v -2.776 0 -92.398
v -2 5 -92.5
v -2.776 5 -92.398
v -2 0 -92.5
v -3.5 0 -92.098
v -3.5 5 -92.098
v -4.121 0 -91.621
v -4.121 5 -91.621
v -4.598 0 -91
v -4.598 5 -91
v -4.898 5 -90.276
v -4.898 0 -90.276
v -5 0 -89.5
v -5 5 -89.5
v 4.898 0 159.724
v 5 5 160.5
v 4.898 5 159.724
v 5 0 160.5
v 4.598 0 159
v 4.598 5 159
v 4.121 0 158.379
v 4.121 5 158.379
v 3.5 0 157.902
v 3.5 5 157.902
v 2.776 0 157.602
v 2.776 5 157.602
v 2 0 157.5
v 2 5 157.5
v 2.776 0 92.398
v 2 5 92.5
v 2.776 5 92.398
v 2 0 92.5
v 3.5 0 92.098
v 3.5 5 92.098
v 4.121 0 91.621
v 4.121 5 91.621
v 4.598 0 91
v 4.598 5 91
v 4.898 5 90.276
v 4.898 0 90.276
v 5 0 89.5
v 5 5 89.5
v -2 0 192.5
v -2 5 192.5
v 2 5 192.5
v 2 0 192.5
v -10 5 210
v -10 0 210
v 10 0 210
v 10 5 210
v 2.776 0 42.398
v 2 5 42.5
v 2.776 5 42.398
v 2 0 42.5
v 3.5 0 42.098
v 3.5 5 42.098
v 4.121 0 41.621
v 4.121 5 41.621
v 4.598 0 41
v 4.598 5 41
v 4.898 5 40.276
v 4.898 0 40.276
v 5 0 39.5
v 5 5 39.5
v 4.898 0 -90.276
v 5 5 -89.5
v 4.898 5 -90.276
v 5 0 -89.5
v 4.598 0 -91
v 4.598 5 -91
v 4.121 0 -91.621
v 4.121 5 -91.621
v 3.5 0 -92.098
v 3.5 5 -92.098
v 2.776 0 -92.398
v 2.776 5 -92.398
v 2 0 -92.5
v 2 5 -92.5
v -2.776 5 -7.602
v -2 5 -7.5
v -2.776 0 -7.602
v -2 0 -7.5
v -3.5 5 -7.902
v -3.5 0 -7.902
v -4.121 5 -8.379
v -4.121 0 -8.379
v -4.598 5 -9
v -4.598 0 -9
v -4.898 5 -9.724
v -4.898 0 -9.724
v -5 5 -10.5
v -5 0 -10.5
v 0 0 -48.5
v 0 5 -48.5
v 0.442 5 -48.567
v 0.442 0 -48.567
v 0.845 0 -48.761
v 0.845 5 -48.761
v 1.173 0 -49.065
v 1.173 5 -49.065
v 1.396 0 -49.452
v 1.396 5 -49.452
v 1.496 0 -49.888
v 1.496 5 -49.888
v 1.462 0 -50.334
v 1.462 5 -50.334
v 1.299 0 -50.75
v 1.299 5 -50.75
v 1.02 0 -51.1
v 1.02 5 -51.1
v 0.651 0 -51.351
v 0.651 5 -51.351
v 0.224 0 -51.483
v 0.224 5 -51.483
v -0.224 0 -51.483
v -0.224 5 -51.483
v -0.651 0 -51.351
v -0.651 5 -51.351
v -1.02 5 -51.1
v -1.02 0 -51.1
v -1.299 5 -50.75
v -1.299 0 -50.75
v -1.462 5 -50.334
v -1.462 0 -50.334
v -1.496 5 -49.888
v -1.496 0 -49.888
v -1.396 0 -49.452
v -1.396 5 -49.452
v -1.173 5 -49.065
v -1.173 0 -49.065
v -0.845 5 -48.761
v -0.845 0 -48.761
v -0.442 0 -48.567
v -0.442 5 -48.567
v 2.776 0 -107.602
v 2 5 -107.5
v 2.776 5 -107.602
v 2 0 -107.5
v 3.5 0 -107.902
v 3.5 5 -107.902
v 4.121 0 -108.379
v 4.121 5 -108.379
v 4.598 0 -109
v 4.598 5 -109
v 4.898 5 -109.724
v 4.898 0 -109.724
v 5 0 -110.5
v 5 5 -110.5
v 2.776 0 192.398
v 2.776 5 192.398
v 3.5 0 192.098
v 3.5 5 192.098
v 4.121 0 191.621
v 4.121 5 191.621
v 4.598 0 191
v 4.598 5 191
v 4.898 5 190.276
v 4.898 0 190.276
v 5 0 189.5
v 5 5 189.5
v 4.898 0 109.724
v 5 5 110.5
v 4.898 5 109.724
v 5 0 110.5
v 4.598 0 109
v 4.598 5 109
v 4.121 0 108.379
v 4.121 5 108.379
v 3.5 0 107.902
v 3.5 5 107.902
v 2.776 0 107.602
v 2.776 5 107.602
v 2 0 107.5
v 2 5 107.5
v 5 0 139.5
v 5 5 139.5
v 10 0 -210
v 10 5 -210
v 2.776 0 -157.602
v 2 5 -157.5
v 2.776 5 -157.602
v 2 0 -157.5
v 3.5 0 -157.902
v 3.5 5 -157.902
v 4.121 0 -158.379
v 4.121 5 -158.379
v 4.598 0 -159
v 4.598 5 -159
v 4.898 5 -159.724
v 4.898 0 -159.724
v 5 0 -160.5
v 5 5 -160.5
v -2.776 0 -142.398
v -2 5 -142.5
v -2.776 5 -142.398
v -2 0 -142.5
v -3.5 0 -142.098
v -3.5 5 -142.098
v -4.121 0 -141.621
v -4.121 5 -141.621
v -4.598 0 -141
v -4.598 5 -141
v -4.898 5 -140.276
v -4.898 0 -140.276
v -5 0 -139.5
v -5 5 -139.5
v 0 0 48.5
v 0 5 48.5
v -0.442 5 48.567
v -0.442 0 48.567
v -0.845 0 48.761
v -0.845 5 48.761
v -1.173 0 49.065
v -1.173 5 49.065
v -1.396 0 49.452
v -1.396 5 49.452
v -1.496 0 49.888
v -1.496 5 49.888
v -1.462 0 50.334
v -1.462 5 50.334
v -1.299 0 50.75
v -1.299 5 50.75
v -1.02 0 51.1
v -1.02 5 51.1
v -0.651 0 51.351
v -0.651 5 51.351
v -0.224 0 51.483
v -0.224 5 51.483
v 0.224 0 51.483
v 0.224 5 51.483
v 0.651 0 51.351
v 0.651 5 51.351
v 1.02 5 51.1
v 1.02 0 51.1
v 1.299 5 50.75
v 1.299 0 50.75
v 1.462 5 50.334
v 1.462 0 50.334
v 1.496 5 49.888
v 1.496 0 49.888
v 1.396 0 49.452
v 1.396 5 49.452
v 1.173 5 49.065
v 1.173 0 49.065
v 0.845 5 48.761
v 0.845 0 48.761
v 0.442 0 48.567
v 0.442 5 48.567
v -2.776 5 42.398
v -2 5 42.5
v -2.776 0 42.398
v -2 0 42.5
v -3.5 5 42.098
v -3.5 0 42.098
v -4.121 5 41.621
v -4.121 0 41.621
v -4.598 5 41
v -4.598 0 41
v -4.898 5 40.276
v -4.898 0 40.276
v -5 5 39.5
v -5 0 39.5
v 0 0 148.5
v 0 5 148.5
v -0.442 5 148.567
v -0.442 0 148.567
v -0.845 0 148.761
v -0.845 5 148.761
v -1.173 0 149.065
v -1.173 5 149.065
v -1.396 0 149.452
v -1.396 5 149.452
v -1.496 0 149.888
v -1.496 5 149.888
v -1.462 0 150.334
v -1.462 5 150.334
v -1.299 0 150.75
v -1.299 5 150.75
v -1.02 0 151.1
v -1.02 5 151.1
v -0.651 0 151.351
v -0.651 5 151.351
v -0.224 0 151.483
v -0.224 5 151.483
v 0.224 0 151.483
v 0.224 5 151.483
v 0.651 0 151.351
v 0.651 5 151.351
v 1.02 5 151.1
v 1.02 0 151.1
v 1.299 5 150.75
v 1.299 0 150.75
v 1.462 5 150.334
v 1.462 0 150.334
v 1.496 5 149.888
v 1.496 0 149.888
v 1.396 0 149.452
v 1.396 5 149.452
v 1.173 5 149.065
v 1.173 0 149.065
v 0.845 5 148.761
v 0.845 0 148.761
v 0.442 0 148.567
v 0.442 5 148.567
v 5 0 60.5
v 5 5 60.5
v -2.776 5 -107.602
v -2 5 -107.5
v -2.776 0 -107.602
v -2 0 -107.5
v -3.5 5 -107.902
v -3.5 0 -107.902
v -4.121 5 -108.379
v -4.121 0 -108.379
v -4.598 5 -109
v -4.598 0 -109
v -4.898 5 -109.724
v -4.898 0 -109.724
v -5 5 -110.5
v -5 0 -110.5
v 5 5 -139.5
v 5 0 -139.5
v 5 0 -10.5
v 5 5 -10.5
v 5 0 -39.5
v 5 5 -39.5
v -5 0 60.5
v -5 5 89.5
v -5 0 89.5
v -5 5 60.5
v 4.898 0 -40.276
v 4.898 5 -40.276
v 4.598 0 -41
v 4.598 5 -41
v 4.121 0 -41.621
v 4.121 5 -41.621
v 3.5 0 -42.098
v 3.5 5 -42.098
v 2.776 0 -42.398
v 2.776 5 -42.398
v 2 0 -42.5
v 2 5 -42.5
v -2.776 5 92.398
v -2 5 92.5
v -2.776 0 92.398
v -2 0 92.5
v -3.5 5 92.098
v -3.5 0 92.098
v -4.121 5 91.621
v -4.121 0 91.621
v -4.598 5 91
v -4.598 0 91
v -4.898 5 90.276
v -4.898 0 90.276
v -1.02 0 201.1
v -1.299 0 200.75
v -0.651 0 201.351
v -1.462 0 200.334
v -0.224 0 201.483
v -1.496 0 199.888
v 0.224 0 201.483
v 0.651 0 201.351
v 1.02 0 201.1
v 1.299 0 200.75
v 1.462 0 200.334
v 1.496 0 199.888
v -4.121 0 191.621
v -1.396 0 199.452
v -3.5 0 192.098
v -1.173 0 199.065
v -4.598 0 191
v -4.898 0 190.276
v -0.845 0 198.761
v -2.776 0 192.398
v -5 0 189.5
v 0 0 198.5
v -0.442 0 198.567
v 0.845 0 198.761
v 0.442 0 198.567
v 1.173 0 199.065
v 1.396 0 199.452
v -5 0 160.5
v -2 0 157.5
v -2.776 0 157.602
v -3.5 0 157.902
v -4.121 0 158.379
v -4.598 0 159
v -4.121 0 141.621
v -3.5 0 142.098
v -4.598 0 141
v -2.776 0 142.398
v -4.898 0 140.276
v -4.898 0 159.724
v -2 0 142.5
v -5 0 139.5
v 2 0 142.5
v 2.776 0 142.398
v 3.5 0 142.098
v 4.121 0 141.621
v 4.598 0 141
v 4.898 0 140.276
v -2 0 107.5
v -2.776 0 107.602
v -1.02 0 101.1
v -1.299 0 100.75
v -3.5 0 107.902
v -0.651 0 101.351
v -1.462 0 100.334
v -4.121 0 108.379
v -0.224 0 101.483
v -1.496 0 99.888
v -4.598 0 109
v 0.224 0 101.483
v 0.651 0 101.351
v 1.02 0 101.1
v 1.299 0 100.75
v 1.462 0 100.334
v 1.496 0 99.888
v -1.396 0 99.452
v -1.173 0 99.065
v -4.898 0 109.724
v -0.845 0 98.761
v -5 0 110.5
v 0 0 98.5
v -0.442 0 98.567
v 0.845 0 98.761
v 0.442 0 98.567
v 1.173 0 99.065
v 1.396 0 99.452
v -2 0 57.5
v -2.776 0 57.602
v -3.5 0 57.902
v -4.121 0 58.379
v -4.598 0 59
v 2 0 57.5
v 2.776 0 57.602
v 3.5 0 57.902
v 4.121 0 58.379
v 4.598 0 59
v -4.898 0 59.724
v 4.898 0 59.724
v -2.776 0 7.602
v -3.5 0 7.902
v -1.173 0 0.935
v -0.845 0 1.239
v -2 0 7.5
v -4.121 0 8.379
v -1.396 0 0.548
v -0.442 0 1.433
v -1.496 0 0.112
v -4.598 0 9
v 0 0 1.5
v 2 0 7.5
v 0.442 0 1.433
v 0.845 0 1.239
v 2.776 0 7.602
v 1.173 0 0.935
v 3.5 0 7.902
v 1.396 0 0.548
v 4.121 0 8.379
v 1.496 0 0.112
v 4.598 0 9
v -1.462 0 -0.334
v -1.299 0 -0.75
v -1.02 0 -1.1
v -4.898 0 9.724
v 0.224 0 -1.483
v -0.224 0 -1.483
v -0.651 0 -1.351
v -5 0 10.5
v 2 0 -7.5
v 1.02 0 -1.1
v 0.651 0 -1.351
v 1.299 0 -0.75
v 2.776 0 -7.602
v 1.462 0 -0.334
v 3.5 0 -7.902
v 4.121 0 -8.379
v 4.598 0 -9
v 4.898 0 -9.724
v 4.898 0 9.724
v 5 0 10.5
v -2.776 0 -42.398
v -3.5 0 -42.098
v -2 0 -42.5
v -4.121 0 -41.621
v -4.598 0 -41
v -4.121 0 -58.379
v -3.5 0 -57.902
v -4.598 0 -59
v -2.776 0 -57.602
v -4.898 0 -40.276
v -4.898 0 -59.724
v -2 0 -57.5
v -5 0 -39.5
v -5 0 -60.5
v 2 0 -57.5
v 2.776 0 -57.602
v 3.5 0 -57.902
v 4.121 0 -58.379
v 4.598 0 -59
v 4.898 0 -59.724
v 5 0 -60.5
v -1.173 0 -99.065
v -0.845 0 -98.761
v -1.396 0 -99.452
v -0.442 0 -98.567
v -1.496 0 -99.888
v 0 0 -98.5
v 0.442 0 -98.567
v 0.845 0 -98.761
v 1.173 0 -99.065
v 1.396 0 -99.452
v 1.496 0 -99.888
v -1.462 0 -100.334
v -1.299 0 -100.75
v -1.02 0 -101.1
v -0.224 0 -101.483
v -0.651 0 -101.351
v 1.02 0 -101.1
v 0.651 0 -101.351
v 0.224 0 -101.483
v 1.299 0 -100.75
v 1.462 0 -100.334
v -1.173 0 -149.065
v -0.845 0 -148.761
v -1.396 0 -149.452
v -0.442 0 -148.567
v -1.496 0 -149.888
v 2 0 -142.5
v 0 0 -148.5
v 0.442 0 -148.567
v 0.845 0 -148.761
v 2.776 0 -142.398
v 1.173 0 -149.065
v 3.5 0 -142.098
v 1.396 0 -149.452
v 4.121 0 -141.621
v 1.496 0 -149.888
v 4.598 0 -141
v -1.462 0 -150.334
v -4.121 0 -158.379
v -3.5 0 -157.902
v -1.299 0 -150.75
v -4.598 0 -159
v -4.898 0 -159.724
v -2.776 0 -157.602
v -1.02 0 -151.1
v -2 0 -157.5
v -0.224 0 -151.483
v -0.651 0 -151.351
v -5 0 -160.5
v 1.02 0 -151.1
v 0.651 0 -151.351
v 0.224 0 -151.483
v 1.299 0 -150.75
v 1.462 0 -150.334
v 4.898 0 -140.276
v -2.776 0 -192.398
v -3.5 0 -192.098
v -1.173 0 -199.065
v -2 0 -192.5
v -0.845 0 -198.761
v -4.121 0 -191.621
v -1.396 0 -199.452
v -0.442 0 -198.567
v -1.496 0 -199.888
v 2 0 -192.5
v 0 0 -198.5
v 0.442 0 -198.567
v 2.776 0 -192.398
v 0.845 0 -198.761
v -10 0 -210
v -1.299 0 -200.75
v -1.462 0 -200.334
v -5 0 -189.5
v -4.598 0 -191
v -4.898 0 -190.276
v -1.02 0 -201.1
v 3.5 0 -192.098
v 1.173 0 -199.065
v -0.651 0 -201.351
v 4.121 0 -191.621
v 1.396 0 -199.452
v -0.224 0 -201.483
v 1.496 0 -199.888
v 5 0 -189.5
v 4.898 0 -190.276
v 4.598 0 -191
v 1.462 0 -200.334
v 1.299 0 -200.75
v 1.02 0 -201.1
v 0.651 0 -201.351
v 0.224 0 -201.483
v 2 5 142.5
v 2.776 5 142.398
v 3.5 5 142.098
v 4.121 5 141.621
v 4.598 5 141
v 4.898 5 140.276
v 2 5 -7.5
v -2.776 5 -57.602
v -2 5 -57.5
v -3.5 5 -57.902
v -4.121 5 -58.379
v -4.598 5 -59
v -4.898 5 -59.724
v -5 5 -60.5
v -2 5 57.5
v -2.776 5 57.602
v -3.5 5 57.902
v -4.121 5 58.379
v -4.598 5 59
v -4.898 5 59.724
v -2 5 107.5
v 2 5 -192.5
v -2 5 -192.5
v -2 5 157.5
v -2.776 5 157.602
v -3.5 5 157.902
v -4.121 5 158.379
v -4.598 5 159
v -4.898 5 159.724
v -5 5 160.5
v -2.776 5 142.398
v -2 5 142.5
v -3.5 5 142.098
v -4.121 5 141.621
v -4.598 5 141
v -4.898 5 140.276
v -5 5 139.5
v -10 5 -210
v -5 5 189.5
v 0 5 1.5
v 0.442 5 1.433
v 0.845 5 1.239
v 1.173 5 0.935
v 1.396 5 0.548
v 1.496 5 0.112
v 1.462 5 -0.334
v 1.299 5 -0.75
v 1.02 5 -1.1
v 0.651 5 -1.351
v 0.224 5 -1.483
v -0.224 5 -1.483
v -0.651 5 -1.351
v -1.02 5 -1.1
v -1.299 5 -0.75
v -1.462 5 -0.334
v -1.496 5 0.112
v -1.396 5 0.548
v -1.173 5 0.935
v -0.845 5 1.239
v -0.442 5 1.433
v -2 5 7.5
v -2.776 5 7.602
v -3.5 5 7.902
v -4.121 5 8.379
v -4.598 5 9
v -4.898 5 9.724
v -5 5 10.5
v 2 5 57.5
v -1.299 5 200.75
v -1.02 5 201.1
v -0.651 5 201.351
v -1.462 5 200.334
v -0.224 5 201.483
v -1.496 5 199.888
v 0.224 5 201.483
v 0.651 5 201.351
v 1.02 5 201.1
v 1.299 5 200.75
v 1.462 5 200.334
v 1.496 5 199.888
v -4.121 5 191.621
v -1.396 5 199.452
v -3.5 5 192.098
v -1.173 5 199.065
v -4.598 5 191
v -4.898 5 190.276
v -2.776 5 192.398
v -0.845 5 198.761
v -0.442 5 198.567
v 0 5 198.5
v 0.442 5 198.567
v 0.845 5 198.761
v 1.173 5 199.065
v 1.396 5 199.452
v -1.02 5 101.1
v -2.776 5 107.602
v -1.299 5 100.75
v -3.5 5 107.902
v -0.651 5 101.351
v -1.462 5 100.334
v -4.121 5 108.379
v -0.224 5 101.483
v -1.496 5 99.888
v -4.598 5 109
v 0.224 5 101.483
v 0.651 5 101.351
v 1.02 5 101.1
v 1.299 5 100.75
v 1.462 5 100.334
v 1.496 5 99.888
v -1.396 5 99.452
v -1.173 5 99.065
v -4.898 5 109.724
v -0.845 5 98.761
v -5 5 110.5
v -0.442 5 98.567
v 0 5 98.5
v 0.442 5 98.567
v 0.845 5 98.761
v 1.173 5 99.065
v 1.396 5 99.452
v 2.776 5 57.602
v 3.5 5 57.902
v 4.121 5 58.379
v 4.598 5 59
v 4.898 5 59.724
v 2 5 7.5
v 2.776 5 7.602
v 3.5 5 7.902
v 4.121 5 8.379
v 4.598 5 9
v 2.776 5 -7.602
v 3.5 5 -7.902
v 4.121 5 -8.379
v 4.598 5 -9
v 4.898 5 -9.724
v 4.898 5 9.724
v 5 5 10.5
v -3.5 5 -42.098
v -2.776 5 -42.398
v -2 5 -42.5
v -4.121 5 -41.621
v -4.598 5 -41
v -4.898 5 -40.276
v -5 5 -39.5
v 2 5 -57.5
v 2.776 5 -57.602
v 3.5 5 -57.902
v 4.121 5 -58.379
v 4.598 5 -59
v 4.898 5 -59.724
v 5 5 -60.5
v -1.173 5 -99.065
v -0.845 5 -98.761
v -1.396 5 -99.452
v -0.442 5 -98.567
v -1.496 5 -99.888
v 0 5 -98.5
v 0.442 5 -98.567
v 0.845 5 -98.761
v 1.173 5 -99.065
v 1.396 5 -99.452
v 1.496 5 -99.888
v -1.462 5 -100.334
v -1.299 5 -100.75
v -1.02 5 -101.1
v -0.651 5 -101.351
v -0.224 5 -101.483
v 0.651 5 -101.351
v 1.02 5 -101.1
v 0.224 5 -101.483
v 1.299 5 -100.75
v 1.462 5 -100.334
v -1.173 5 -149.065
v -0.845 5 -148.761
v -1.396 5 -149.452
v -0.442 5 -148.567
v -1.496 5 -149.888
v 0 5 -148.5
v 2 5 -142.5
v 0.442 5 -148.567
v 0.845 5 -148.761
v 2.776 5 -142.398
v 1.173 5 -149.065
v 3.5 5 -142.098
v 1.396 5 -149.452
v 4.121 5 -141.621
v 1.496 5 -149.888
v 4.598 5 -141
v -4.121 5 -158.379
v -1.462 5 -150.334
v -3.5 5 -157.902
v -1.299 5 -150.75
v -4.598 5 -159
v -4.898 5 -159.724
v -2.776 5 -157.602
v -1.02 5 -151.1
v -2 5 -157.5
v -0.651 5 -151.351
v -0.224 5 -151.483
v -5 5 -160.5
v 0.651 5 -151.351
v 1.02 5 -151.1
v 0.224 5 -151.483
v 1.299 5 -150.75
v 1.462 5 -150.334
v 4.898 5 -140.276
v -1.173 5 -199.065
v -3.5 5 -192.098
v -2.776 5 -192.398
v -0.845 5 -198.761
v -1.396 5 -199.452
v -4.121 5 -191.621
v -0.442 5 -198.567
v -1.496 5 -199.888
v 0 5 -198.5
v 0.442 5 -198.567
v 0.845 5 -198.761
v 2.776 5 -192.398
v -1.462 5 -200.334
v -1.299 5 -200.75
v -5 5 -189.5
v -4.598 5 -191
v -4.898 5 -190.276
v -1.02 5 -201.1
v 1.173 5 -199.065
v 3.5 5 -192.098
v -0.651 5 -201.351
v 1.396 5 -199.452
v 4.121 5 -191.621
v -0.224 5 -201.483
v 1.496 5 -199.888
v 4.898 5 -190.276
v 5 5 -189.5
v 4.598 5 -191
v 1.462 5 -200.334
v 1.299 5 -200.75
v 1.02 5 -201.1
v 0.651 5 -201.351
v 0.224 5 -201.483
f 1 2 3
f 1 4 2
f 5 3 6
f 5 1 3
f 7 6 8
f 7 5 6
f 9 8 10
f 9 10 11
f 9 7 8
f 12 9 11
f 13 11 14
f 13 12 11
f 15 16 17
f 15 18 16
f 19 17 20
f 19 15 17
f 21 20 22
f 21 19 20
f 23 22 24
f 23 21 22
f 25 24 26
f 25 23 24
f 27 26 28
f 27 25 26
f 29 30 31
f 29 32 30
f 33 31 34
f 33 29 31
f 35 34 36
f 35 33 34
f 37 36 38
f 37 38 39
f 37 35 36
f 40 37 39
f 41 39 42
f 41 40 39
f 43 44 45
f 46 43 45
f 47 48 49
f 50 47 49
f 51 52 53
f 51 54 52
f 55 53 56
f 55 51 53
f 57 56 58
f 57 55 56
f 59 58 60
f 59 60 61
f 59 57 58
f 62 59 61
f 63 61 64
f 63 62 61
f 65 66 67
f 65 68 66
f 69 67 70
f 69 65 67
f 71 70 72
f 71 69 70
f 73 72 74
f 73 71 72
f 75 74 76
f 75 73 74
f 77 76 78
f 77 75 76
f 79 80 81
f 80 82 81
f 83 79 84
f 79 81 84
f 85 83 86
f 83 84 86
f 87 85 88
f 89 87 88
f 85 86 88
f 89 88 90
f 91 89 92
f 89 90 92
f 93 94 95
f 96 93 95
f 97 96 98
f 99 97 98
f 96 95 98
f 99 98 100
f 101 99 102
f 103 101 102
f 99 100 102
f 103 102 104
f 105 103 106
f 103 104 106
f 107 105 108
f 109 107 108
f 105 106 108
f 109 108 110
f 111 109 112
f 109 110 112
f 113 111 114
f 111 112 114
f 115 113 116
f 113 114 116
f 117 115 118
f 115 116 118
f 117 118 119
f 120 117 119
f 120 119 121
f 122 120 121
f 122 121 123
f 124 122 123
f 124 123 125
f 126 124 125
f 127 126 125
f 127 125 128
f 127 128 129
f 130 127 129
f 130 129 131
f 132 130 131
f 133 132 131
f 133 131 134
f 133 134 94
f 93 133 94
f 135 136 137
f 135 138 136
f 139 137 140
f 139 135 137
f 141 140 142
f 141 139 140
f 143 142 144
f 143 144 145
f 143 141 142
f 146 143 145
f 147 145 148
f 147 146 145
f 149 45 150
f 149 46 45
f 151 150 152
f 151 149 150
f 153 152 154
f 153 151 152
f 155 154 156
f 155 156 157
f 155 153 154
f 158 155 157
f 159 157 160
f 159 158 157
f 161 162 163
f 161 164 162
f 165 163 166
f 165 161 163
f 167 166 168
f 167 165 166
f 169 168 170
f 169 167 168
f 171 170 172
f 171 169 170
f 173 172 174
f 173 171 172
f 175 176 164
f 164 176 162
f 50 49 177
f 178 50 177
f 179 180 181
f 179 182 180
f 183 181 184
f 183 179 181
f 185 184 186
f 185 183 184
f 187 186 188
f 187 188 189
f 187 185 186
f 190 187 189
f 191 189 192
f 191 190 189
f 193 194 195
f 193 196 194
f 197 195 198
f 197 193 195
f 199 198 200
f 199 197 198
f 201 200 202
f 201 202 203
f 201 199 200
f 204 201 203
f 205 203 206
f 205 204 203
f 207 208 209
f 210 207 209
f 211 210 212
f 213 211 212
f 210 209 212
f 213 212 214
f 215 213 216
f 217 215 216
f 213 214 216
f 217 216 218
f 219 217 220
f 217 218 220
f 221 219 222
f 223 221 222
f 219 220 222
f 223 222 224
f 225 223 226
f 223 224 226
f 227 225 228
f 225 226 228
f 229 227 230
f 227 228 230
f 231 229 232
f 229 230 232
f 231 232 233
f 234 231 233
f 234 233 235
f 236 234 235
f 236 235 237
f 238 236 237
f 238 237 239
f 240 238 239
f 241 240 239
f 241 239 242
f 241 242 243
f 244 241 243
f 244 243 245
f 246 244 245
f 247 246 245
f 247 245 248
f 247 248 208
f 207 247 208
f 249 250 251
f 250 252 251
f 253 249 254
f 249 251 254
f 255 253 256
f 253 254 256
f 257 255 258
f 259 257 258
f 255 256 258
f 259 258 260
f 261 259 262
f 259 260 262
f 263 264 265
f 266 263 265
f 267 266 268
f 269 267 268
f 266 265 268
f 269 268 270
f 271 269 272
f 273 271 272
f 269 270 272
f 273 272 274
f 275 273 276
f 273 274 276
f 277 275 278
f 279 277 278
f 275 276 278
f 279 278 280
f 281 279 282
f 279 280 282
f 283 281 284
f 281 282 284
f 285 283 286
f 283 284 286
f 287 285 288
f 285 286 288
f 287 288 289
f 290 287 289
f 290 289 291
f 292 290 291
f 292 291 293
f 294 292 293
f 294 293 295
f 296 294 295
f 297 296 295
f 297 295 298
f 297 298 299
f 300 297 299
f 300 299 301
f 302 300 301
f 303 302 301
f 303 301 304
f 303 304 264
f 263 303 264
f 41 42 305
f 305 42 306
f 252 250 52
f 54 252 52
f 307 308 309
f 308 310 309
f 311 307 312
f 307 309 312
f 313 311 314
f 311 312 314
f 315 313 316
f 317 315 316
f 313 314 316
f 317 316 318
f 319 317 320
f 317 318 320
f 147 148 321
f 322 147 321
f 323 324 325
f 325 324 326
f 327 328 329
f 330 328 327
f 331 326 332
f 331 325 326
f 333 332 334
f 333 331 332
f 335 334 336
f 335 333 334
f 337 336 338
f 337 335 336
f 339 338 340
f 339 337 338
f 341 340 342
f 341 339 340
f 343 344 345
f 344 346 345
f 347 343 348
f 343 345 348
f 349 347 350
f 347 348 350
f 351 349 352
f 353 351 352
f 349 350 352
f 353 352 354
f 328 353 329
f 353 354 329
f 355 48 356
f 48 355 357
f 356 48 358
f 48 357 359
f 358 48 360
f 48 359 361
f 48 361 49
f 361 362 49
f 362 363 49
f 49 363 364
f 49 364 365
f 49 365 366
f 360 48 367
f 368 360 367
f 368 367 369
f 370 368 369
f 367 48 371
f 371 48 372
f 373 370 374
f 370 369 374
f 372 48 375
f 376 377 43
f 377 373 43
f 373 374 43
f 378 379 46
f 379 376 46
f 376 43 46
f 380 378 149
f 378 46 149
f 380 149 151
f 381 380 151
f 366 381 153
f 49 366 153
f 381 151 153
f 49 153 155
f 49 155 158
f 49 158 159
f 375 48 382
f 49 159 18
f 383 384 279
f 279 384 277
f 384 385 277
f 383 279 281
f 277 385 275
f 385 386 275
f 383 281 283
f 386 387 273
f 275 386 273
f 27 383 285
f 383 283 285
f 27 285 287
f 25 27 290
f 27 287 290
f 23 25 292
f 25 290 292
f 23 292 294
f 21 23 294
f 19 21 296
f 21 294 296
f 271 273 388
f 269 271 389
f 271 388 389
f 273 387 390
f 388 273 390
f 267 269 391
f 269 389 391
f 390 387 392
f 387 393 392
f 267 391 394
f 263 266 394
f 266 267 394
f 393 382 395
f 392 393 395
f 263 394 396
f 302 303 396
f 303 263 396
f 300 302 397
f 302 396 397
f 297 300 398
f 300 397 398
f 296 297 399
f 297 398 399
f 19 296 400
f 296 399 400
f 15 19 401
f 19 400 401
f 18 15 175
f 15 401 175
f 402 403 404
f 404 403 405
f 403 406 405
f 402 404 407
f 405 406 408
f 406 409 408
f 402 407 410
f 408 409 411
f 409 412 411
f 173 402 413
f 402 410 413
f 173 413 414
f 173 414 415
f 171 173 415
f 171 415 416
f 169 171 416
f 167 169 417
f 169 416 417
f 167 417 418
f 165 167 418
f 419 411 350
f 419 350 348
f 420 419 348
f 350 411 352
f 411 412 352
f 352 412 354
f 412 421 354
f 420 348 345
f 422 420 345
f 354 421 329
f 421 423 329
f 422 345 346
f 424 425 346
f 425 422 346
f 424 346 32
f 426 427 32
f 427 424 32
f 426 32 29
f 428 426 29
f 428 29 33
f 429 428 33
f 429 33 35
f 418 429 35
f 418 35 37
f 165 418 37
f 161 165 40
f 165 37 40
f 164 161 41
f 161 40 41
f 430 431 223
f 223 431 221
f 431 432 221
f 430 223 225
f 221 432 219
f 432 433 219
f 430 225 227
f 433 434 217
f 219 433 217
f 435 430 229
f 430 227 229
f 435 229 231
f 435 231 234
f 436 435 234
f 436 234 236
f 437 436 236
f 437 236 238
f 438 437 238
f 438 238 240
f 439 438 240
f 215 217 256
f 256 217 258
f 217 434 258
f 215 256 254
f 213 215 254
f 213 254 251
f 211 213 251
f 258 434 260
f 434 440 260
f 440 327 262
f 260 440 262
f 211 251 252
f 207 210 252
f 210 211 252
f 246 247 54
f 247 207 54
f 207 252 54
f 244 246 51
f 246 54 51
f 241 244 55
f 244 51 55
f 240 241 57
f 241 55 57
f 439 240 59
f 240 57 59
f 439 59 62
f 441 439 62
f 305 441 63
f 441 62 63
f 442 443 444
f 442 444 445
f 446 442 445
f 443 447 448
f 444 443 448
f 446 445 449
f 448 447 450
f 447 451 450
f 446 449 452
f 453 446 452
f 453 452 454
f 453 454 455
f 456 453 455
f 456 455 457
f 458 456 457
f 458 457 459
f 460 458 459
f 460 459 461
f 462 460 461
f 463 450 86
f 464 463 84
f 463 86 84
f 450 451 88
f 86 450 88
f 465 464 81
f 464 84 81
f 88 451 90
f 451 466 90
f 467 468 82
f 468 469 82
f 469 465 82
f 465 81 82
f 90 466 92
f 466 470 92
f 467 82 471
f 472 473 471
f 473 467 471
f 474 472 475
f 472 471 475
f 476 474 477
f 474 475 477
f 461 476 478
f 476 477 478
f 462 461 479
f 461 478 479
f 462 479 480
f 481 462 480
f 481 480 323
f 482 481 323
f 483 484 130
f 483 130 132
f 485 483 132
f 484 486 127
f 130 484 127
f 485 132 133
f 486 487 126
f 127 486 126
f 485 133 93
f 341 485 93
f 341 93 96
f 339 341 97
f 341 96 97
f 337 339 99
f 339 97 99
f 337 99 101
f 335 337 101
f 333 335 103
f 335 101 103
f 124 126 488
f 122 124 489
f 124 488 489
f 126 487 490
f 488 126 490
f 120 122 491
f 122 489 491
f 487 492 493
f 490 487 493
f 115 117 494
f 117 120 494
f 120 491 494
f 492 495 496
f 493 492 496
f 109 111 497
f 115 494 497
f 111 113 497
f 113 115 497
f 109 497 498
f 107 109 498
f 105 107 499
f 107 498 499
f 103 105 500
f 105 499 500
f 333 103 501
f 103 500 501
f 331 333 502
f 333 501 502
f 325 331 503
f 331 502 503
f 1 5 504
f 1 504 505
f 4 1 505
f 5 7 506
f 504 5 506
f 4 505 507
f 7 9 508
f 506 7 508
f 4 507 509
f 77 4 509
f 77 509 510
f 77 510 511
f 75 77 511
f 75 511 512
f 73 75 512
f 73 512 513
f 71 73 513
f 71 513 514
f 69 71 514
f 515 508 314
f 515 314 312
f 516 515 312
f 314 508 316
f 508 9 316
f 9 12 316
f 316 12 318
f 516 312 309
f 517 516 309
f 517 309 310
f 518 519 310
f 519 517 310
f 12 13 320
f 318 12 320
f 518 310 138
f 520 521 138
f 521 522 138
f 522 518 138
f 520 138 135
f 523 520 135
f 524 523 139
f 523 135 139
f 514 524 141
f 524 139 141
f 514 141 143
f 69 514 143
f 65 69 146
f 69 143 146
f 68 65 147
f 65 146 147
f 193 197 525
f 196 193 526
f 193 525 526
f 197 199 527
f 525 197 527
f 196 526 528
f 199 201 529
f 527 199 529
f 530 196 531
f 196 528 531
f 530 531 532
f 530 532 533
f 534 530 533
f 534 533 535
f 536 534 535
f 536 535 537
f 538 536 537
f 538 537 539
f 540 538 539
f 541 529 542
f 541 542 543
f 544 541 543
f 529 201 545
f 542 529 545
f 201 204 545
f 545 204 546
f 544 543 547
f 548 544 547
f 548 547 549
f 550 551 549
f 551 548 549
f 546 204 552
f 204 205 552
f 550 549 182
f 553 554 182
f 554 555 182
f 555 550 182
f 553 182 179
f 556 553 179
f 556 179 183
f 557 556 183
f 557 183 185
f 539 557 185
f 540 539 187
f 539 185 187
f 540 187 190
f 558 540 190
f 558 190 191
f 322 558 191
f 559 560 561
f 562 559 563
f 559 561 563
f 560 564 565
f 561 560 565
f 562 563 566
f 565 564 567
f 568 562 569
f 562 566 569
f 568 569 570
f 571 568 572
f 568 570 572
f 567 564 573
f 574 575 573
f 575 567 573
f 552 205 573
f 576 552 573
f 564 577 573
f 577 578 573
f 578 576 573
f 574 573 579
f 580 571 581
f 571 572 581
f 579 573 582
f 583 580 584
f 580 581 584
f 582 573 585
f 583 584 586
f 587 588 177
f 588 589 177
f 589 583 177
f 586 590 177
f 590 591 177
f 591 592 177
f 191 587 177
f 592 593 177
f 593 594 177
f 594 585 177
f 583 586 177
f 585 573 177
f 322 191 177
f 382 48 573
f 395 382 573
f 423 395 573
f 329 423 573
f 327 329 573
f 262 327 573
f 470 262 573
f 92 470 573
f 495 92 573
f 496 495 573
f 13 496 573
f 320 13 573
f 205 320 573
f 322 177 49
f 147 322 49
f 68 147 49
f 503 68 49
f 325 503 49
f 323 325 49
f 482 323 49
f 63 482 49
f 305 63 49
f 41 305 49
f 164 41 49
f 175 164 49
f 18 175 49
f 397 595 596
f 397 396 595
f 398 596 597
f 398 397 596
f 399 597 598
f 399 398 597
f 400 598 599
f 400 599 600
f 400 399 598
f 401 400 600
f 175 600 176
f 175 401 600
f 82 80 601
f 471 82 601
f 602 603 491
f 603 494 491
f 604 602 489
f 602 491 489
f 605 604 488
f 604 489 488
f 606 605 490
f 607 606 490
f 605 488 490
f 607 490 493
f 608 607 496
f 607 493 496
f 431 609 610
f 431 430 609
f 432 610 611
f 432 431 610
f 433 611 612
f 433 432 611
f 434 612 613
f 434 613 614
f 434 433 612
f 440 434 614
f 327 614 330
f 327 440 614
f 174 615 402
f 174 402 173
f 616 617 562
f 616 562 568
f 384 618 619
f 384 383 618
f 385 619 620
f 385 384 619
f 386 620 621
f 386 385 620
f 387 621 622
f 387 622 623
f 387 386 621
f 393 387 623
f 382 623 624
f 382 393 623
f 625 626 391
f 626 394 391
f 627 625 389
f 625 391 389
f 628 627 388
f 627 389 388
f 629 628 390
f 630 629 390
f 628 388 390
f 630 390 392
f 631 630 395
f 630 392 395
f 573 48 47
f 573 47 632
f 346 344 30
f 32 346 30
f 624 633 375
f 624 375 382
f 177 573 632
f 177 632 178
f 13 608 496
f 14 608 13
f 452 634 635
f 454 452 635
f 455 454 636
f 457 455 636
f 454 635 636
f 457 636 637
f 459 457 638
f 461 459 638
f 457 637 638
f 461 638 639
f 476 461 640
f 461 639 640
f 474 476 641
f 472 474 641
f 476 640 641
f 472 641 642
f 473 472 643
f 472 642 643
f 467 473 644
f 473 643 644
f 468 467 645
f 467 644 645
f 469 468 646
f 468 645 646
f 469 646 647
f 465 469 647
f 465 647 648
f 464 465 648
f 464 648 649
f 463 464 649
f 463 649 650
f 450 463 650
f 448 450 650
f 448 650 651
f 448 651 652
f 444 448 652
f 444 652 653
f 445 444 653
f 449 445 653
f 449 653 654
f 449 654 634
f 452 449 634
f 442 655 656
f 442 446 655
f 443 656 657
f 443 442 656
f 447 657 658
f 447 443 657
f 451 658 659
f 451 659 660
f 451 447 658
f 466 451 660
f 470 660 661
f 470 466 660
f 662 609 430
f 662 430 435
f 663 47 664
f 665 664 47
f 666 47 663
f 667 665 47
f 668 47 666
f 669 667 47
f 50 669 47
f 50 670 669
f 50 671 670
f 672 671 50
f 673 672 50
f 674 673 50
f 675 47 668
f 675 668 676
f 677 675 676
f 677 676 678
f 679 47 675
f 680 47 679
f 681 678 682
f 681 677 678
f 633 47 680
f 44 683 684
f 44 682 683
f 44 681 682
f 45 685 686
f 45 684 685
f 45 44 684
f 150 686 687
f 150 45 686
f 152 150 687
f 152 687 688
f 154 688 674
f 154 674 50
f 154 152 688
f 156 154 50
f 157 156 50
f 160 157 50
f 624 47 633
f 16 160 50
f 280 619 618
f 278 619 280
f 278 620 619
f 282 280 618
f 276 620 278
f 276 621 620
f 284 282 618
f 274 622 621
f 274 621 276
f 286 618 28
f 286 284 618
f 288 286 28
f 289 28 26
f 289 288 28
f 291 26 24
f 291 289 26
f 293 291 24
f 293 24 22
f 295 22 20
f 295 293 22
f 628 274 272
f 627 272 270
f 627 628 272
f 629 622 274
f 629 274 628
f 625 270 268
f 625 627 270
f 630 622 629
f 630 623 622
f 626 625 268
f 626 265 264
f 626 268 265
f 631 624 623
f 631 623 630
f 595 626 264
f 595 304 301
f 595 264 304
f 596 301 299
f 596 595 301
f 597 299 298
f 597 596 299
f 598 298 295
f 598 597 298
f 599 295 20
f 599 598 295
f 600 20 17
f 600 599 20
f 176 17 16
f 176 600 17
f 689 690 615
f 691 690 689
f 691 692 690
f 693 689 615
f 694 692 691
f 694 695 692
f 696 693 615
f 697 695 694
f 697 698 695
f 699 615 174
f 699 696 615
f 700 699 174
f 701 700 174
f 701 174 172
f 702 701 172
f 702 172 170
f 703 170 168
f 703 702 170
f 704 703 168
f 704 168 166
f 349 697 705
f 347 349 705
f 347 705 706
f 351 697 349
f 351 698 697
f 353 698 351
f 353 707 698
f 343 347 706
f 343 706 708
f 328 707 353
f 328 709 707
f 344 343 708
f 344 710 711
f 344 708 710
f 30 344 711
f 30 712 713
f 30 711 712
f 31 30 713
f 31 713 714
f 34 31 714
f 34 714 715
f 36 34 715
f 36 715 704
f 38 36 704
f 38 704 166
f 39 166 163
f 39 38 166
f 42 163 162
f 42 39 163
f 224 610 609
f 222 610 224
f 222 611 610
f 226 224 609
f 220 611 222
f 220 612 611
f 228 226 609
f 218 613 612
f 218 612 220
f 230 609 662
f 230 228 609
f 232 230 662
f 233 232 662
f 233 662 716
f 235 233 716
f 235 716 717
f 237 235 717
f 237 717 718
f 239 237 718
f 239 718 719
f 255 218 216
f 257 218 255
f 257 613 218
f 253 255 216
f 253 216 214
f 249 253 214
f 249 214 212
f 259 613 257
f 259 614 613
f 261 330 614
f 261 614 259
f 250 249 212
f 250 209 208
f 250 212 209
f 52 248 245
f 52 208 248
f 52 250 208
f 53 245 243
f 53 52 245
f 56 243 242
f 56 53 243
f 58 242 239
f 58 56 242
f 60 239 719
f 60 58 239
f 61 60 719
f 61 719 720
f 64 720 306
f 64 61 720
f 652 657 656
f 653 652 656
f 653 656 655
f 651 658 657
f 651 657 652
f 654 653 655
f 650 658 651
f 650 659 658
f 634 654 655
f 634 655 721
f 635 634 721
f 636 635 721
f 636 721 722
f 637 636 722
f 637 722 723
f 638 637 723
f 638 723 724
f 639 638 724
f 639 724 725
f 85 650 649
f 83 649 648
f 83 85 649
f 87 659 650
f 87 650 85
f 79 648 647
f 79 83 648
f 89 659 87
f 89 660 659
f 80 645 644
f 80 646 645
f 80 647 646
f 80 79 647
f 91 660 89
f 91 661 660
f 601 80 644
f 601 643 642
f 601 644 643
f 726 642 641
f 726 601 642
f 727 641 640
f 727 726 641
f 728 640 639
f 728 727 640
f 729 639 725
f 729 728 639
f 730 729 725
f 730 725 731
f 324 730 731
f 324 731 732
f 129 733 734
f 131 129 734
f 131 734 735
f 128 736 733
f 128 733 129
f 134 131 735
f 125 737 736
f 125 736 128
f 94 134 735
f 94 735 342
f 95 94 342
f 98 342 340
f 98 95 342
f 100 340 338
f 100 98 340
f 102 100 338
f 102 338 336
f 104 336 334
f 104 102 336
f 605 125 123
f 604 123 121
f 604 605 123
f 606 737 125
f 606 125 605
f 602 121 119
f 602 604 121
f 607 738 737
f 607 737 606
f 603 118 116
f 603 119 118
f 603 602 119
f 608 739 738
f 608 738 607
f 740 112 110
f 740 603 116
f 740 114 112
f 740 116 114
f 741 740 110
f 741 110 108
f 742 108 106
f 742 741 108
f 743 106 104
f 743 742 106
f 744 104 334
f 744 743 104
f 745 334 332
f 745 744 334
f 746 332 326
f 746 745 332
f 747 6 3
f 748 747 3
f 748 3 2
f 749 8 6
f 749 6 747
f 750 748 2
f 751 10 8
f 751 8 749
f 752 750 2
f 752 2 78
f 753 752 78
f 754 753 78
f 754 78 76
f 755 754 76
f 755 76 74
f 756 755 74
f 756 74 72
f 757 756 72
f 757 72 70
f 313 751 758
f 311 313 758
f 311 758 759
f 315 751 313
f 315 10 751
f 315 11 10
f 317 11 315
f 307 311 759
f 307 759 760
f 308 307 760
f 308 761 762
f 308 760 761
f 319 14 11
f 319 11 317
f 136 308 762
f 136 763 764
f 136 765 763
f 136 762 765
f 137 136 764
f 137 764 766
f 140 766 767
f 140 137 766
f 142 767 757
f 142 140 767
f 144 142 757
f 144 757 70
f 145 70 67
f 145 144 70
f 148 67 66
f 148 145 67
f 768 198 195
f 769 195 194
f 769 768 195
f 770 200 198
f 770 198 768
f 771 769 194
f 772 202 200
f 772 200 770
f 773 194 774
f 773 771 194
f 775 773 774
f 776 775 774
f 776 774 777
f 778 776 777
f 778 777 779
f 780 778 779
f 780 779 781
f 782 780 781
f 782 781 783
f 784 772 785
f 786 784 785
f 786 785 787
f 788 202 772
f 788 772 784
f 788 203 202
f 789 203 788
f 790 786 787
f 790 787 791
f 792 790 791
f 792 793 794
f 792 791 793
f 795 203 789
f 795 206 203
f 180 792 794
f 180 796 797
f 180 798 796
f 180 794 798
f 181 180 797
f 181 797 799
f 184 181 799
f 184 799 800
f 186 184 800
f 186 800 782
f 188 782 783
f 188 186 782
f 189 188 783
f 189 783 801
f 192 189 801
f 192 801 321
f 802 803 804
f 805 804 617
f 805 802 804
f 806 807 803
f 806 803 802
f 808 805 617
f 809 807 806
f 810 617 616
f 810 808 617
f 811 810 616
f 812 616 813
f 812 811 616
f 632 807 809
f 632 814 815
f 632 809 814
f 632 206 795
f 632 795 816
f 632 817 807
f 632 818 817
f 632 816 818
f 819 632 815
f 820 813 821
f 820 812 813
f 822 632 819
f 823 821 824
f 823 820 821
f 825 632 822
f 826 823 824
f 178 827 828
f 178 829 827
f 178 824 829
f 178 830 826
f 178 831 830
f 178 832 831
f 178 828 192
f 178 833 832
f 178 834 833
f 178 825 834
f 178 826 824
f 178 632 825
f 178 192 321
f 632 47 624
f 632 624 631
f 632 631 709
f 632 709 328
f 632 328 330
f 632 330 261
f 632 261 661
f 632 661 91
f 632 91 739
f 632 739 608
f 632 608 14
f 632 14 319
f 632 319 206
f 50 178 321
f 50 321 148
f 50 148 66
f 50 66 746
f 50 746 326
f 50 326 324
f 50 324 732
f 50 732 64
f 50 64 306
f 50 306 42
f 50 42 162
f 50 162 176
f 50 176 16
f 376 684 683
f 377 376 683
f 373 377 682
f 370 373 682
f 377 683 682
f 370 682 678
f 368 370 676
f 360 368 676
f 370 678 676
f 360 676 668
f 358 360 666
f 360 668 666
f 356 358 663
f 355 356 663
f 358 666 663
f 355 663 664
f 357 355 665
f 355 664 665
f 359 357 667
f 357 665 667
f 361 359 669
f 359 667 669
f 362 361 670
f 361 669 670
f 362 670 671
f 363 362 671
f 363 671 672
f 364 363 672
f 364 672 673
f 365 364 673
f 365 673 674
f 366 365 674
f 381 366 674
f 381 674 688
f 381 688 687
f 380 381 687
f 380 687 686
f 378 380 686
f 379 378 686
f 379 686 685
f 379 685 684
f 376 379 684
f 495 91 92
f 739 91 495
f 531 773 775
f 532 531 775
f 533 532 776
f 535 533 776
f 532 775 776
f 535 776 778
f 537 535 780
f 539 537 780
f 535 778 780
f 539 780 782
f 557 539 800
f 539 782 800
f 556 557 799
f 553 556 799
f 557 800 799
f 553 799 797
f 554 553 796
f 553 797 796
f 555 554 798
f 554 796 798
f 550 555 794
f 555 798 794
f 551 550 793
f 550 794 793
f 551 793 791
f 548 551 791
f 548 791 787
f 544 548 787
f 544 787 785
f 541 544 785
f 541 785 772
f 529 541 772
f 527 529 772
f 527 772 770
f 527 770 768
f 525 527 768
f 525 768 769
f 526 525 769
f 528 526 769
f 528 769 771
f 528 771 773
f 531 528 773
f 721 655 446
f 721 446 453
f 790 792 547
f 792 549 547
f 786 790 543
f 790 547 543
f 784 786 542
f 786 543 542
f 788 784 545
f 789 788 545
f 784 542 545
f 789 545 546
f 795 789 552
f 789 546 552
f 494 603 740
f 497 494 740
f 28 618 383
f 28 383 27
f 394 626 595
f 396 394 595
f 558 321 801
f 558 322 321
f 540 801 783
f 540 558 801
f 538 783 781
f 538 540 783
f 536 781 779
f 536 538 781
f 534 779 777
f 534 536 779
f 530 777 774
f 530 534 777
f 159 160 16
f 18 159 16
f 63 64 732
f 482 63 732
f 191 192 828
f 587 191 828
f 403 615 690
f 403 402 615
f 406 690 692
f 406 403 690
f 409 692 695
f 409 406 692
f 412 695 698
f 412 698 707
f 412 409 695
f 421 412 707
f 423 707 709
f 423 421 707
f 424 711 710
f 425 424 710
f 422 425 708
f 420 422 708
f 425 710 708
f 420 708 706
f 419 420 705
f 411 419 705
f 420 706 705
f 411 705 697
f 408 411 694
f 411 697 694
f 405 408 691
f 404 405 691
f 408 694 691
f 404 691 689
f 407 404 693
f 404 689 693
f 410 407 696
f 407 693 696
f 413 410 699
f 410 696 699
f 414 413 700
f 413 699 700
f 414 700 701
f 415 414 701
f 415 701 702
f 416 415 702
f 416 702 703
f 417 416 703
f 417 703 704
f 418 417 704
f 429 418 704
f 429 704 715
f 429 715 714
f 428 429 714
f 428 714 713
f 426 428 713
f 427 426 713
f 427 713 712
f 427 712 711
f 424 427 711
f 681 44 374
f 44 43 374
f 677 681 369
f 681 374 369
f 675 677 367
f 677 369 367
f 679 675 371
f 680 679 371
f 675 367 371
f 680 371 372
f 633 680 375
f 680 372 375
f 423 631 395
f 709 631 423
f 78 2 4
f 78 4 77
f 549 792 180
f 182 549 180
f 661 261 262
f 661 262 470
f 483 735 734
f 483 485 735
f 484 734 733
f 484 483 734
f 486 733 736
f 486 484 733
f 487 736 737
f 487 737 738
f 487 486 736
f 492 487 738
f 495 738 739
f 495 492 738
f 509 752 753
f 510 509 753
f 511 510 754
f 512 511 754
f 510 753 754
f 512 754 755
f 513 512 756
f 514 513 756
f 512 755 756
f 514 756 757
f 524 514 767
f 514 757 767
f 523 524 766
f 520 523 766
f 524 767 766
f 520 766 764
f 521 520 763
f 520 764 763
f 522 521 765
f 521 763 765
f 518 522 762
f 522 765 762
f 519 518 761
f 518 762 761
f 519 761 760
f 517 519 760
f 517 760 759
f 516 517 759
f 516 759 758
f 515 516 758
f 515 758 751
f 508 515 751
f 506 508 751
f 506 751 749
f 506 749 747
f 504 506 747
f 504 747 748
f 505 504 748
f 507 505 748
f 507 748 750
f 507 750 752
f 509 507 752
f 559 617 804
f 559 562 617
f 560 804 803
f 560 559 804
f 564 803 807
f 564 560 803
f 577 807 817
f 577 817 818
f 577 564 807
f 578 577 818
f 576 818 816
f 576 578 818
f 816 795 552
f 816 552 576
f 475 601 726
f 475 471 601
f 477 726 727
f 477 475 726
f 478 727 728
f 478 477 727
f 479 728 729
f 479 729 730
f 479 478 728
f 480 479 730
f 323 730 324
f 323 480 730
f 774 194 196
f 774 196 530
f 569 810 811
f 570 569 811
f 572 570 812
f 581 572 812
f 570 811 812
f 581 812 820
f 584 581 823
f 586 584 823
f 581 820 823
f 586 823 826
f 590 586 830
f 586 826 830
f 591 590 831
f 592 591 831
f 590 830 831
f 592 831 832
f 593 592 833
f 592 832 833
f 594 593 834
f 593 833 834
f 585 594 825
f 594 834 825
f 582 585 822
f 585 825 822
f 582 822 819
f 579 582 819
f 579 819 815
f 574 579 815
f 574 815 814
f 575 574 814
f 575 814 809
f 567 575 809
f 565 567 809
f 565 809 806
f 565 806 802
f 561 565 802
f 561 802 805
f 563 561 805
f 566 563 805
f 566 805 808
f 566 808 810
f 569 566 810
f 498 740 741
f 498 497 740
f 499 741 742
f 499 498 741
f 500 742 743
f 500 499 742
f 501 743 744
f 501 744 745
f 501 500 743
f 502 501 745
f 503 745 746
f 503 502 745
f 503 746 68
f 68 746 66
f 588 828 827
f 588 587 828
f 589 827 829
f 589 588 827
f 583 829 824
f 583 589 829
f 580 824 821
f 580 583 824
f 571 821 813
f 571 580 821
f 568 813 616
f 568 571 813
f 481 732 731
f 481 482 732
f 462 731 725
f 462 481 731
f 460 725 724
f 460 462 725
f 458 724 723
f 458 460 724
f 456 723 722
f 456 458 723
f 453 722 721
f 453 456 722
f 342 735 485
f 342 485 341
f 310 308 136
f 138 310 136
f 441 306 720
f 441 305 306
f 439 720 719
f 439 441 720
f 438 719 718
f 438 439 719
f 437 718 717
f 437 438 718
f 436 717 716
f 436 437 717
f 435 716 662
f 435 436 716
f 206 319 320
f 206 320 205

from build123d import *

# Parameters (mm, degrees)
SKETCH_1_W          = 20
SKETCH_1_H          = 420
EXTRUDE_1_DEPTH     = 5
SKETCH_2_R          = 1.5
CUT_EXTRUDE_1_DEPTH = 211.297408448
SKETCH_3_W          = 10
SKETCH_3_H          = 35
CUT_EXTRUDE_2_DEPTH = 211.297408448
FILLET_1_R          = 3


with BuildPart() as part:
    # 草图1 → 凸台-拉伸1 (new body)
    with BuildSketch(Plane(origin=(0, 0, 0), x_dir=(1, 0, 0), z_dir=(0, 1, 0))):
        Rectangle(SKETCH_1_W, SKETCH_1_H)
    extrude(amount=EXTRUDE_1_DEPTH)

    # 草图2 → 切除-拉伸1 (cut, through all)
    with BuildSketch(Plane(origin=(0, 5, 0), x_dir=(1, 0, 0), z_dir=(0, 1, 0))):
        with Locations(Location((0, 0, 0), (0, 0, 270))):
            Circle(SKETCH_2_R)
        with Locations(Location((0, 50, 0), (0, 0, 270))):
            Circle(SKETCH_2_R)
        with Locations(Location((0, 100, 0), (0, 0, 270))):
            Circle(SKETCH_2_R)
        with Locations(Location((0, 150, 0), (0, 0, 270))):
            Circle(SKETCH_2_R)
        with Locations(Location((0, 200, 0), (0, 0, 270))):
            Circle(SKETCH_2_R)
        with Locations(Location((0, -200, 0), (0, 0, 90))):
            Circle(SKETCH_2_R)
        with Locations(Location((0, -150, 0), (0, 0, 90))):
            Circle(SKETCH_2_R)
        with Locations(Location((0, -100, 0), (0, 0, 90))):
            Circle(SKETCH_2_R)
        with Locations(Location((0, -50, 0), (0, 0, 90))):
            Circle(SKETCH_2_R)
    extrude(amount=-CUT_EXTRUDE_1_DEPTH, mode=Mode.SUBTRACT)

    # 草图3 → 切除-拉伸2 (cut, through all)
    with BuildSketch(Plane(origin=(0, 5, 0), x_dir=(1, 0, 0), z_dir=(0, 1, 0))):
        with Locations((0, 125)):
            Rectangle(SKETCH_3_W, SKETCH_3_H)
        with Locations((0, 175)):
            Rectangle(SKETCH_3_W, SKETCH_3_H)
        with Locations((0, 75)):
            Rectangle(SKETCH_3_W, SKETCH_3_H)
        with Locations((0, 25)):
            Rectangle(SKETCH_3_W, SKETCH_3_H)
        with Locations((0, -25)):
            Rectangle(SKETCH_3_W, SKETCH_3_H)
        with Locations((0, -75)):
            Rectangle(SKETCH_3_W, SKETCH_3_H)
        with Locations((0, -125)):
            Rectangle(SKETCH_3_W, SKETCH_3_H)
        with Locations((0, -175)):
            Rectangle(SKETCH_3_W, SKETCH_3_H)
    extrude(amount=-CUT_EXTRUDE_2_DEPTH, mode=Mode.SUBTRACT)

    # 圆角1
    fillet_1_edges = [part.edges().sort_by_distance(p)[0] for p in [
        (-5, 2.5, -42.5),
        (5, 2.5, -42.5),
        (5, 2.5, -7.5),
        (-5, 2.5, -7.5),
        (-5, 2.5, 7.5),
        (5, 2.5, 7.5),
        (5, 2.5, 42.5),
        (-5, 2.5, 42.5),
        (-5, 2.5, 57.5),
        (5, 2.5, 57.5),
        (5, 2.5, 92.5),
        (-5, 2.5, 92.5),
        (-5, 2.5, 107.5),
        (5, 2.5, 107.5),
        (5, 2.5, 142.5),
        (-5, 2.5, 142.5),
        (-5, 2.5, 157.5),
        (5, 2.5, 157.5),
        (5, 2.5, 192.5),
        (-5, 2.5, 192.5),
        (5, 2.5, -192.5),
        (5, 2.5, -157.5),
        (-5, 2.5, -157.5),
        (-5, 2.5, -192.5),
        (-5, 2.5, -142.5),
        (5, 2.5, -142.5),
        (5, 2.5, -107.5),
        (-5, 2.5, -107.5),
        (-5, 2.5, -92.5),
        (5, 2.5, -92.5),
        (5, 2.5, -57.5),
        (-5, 2.5, -57.5),
    ]]
    fillet(fillet_1_edges, radius=FILLET_1_R)


solid = part.part
